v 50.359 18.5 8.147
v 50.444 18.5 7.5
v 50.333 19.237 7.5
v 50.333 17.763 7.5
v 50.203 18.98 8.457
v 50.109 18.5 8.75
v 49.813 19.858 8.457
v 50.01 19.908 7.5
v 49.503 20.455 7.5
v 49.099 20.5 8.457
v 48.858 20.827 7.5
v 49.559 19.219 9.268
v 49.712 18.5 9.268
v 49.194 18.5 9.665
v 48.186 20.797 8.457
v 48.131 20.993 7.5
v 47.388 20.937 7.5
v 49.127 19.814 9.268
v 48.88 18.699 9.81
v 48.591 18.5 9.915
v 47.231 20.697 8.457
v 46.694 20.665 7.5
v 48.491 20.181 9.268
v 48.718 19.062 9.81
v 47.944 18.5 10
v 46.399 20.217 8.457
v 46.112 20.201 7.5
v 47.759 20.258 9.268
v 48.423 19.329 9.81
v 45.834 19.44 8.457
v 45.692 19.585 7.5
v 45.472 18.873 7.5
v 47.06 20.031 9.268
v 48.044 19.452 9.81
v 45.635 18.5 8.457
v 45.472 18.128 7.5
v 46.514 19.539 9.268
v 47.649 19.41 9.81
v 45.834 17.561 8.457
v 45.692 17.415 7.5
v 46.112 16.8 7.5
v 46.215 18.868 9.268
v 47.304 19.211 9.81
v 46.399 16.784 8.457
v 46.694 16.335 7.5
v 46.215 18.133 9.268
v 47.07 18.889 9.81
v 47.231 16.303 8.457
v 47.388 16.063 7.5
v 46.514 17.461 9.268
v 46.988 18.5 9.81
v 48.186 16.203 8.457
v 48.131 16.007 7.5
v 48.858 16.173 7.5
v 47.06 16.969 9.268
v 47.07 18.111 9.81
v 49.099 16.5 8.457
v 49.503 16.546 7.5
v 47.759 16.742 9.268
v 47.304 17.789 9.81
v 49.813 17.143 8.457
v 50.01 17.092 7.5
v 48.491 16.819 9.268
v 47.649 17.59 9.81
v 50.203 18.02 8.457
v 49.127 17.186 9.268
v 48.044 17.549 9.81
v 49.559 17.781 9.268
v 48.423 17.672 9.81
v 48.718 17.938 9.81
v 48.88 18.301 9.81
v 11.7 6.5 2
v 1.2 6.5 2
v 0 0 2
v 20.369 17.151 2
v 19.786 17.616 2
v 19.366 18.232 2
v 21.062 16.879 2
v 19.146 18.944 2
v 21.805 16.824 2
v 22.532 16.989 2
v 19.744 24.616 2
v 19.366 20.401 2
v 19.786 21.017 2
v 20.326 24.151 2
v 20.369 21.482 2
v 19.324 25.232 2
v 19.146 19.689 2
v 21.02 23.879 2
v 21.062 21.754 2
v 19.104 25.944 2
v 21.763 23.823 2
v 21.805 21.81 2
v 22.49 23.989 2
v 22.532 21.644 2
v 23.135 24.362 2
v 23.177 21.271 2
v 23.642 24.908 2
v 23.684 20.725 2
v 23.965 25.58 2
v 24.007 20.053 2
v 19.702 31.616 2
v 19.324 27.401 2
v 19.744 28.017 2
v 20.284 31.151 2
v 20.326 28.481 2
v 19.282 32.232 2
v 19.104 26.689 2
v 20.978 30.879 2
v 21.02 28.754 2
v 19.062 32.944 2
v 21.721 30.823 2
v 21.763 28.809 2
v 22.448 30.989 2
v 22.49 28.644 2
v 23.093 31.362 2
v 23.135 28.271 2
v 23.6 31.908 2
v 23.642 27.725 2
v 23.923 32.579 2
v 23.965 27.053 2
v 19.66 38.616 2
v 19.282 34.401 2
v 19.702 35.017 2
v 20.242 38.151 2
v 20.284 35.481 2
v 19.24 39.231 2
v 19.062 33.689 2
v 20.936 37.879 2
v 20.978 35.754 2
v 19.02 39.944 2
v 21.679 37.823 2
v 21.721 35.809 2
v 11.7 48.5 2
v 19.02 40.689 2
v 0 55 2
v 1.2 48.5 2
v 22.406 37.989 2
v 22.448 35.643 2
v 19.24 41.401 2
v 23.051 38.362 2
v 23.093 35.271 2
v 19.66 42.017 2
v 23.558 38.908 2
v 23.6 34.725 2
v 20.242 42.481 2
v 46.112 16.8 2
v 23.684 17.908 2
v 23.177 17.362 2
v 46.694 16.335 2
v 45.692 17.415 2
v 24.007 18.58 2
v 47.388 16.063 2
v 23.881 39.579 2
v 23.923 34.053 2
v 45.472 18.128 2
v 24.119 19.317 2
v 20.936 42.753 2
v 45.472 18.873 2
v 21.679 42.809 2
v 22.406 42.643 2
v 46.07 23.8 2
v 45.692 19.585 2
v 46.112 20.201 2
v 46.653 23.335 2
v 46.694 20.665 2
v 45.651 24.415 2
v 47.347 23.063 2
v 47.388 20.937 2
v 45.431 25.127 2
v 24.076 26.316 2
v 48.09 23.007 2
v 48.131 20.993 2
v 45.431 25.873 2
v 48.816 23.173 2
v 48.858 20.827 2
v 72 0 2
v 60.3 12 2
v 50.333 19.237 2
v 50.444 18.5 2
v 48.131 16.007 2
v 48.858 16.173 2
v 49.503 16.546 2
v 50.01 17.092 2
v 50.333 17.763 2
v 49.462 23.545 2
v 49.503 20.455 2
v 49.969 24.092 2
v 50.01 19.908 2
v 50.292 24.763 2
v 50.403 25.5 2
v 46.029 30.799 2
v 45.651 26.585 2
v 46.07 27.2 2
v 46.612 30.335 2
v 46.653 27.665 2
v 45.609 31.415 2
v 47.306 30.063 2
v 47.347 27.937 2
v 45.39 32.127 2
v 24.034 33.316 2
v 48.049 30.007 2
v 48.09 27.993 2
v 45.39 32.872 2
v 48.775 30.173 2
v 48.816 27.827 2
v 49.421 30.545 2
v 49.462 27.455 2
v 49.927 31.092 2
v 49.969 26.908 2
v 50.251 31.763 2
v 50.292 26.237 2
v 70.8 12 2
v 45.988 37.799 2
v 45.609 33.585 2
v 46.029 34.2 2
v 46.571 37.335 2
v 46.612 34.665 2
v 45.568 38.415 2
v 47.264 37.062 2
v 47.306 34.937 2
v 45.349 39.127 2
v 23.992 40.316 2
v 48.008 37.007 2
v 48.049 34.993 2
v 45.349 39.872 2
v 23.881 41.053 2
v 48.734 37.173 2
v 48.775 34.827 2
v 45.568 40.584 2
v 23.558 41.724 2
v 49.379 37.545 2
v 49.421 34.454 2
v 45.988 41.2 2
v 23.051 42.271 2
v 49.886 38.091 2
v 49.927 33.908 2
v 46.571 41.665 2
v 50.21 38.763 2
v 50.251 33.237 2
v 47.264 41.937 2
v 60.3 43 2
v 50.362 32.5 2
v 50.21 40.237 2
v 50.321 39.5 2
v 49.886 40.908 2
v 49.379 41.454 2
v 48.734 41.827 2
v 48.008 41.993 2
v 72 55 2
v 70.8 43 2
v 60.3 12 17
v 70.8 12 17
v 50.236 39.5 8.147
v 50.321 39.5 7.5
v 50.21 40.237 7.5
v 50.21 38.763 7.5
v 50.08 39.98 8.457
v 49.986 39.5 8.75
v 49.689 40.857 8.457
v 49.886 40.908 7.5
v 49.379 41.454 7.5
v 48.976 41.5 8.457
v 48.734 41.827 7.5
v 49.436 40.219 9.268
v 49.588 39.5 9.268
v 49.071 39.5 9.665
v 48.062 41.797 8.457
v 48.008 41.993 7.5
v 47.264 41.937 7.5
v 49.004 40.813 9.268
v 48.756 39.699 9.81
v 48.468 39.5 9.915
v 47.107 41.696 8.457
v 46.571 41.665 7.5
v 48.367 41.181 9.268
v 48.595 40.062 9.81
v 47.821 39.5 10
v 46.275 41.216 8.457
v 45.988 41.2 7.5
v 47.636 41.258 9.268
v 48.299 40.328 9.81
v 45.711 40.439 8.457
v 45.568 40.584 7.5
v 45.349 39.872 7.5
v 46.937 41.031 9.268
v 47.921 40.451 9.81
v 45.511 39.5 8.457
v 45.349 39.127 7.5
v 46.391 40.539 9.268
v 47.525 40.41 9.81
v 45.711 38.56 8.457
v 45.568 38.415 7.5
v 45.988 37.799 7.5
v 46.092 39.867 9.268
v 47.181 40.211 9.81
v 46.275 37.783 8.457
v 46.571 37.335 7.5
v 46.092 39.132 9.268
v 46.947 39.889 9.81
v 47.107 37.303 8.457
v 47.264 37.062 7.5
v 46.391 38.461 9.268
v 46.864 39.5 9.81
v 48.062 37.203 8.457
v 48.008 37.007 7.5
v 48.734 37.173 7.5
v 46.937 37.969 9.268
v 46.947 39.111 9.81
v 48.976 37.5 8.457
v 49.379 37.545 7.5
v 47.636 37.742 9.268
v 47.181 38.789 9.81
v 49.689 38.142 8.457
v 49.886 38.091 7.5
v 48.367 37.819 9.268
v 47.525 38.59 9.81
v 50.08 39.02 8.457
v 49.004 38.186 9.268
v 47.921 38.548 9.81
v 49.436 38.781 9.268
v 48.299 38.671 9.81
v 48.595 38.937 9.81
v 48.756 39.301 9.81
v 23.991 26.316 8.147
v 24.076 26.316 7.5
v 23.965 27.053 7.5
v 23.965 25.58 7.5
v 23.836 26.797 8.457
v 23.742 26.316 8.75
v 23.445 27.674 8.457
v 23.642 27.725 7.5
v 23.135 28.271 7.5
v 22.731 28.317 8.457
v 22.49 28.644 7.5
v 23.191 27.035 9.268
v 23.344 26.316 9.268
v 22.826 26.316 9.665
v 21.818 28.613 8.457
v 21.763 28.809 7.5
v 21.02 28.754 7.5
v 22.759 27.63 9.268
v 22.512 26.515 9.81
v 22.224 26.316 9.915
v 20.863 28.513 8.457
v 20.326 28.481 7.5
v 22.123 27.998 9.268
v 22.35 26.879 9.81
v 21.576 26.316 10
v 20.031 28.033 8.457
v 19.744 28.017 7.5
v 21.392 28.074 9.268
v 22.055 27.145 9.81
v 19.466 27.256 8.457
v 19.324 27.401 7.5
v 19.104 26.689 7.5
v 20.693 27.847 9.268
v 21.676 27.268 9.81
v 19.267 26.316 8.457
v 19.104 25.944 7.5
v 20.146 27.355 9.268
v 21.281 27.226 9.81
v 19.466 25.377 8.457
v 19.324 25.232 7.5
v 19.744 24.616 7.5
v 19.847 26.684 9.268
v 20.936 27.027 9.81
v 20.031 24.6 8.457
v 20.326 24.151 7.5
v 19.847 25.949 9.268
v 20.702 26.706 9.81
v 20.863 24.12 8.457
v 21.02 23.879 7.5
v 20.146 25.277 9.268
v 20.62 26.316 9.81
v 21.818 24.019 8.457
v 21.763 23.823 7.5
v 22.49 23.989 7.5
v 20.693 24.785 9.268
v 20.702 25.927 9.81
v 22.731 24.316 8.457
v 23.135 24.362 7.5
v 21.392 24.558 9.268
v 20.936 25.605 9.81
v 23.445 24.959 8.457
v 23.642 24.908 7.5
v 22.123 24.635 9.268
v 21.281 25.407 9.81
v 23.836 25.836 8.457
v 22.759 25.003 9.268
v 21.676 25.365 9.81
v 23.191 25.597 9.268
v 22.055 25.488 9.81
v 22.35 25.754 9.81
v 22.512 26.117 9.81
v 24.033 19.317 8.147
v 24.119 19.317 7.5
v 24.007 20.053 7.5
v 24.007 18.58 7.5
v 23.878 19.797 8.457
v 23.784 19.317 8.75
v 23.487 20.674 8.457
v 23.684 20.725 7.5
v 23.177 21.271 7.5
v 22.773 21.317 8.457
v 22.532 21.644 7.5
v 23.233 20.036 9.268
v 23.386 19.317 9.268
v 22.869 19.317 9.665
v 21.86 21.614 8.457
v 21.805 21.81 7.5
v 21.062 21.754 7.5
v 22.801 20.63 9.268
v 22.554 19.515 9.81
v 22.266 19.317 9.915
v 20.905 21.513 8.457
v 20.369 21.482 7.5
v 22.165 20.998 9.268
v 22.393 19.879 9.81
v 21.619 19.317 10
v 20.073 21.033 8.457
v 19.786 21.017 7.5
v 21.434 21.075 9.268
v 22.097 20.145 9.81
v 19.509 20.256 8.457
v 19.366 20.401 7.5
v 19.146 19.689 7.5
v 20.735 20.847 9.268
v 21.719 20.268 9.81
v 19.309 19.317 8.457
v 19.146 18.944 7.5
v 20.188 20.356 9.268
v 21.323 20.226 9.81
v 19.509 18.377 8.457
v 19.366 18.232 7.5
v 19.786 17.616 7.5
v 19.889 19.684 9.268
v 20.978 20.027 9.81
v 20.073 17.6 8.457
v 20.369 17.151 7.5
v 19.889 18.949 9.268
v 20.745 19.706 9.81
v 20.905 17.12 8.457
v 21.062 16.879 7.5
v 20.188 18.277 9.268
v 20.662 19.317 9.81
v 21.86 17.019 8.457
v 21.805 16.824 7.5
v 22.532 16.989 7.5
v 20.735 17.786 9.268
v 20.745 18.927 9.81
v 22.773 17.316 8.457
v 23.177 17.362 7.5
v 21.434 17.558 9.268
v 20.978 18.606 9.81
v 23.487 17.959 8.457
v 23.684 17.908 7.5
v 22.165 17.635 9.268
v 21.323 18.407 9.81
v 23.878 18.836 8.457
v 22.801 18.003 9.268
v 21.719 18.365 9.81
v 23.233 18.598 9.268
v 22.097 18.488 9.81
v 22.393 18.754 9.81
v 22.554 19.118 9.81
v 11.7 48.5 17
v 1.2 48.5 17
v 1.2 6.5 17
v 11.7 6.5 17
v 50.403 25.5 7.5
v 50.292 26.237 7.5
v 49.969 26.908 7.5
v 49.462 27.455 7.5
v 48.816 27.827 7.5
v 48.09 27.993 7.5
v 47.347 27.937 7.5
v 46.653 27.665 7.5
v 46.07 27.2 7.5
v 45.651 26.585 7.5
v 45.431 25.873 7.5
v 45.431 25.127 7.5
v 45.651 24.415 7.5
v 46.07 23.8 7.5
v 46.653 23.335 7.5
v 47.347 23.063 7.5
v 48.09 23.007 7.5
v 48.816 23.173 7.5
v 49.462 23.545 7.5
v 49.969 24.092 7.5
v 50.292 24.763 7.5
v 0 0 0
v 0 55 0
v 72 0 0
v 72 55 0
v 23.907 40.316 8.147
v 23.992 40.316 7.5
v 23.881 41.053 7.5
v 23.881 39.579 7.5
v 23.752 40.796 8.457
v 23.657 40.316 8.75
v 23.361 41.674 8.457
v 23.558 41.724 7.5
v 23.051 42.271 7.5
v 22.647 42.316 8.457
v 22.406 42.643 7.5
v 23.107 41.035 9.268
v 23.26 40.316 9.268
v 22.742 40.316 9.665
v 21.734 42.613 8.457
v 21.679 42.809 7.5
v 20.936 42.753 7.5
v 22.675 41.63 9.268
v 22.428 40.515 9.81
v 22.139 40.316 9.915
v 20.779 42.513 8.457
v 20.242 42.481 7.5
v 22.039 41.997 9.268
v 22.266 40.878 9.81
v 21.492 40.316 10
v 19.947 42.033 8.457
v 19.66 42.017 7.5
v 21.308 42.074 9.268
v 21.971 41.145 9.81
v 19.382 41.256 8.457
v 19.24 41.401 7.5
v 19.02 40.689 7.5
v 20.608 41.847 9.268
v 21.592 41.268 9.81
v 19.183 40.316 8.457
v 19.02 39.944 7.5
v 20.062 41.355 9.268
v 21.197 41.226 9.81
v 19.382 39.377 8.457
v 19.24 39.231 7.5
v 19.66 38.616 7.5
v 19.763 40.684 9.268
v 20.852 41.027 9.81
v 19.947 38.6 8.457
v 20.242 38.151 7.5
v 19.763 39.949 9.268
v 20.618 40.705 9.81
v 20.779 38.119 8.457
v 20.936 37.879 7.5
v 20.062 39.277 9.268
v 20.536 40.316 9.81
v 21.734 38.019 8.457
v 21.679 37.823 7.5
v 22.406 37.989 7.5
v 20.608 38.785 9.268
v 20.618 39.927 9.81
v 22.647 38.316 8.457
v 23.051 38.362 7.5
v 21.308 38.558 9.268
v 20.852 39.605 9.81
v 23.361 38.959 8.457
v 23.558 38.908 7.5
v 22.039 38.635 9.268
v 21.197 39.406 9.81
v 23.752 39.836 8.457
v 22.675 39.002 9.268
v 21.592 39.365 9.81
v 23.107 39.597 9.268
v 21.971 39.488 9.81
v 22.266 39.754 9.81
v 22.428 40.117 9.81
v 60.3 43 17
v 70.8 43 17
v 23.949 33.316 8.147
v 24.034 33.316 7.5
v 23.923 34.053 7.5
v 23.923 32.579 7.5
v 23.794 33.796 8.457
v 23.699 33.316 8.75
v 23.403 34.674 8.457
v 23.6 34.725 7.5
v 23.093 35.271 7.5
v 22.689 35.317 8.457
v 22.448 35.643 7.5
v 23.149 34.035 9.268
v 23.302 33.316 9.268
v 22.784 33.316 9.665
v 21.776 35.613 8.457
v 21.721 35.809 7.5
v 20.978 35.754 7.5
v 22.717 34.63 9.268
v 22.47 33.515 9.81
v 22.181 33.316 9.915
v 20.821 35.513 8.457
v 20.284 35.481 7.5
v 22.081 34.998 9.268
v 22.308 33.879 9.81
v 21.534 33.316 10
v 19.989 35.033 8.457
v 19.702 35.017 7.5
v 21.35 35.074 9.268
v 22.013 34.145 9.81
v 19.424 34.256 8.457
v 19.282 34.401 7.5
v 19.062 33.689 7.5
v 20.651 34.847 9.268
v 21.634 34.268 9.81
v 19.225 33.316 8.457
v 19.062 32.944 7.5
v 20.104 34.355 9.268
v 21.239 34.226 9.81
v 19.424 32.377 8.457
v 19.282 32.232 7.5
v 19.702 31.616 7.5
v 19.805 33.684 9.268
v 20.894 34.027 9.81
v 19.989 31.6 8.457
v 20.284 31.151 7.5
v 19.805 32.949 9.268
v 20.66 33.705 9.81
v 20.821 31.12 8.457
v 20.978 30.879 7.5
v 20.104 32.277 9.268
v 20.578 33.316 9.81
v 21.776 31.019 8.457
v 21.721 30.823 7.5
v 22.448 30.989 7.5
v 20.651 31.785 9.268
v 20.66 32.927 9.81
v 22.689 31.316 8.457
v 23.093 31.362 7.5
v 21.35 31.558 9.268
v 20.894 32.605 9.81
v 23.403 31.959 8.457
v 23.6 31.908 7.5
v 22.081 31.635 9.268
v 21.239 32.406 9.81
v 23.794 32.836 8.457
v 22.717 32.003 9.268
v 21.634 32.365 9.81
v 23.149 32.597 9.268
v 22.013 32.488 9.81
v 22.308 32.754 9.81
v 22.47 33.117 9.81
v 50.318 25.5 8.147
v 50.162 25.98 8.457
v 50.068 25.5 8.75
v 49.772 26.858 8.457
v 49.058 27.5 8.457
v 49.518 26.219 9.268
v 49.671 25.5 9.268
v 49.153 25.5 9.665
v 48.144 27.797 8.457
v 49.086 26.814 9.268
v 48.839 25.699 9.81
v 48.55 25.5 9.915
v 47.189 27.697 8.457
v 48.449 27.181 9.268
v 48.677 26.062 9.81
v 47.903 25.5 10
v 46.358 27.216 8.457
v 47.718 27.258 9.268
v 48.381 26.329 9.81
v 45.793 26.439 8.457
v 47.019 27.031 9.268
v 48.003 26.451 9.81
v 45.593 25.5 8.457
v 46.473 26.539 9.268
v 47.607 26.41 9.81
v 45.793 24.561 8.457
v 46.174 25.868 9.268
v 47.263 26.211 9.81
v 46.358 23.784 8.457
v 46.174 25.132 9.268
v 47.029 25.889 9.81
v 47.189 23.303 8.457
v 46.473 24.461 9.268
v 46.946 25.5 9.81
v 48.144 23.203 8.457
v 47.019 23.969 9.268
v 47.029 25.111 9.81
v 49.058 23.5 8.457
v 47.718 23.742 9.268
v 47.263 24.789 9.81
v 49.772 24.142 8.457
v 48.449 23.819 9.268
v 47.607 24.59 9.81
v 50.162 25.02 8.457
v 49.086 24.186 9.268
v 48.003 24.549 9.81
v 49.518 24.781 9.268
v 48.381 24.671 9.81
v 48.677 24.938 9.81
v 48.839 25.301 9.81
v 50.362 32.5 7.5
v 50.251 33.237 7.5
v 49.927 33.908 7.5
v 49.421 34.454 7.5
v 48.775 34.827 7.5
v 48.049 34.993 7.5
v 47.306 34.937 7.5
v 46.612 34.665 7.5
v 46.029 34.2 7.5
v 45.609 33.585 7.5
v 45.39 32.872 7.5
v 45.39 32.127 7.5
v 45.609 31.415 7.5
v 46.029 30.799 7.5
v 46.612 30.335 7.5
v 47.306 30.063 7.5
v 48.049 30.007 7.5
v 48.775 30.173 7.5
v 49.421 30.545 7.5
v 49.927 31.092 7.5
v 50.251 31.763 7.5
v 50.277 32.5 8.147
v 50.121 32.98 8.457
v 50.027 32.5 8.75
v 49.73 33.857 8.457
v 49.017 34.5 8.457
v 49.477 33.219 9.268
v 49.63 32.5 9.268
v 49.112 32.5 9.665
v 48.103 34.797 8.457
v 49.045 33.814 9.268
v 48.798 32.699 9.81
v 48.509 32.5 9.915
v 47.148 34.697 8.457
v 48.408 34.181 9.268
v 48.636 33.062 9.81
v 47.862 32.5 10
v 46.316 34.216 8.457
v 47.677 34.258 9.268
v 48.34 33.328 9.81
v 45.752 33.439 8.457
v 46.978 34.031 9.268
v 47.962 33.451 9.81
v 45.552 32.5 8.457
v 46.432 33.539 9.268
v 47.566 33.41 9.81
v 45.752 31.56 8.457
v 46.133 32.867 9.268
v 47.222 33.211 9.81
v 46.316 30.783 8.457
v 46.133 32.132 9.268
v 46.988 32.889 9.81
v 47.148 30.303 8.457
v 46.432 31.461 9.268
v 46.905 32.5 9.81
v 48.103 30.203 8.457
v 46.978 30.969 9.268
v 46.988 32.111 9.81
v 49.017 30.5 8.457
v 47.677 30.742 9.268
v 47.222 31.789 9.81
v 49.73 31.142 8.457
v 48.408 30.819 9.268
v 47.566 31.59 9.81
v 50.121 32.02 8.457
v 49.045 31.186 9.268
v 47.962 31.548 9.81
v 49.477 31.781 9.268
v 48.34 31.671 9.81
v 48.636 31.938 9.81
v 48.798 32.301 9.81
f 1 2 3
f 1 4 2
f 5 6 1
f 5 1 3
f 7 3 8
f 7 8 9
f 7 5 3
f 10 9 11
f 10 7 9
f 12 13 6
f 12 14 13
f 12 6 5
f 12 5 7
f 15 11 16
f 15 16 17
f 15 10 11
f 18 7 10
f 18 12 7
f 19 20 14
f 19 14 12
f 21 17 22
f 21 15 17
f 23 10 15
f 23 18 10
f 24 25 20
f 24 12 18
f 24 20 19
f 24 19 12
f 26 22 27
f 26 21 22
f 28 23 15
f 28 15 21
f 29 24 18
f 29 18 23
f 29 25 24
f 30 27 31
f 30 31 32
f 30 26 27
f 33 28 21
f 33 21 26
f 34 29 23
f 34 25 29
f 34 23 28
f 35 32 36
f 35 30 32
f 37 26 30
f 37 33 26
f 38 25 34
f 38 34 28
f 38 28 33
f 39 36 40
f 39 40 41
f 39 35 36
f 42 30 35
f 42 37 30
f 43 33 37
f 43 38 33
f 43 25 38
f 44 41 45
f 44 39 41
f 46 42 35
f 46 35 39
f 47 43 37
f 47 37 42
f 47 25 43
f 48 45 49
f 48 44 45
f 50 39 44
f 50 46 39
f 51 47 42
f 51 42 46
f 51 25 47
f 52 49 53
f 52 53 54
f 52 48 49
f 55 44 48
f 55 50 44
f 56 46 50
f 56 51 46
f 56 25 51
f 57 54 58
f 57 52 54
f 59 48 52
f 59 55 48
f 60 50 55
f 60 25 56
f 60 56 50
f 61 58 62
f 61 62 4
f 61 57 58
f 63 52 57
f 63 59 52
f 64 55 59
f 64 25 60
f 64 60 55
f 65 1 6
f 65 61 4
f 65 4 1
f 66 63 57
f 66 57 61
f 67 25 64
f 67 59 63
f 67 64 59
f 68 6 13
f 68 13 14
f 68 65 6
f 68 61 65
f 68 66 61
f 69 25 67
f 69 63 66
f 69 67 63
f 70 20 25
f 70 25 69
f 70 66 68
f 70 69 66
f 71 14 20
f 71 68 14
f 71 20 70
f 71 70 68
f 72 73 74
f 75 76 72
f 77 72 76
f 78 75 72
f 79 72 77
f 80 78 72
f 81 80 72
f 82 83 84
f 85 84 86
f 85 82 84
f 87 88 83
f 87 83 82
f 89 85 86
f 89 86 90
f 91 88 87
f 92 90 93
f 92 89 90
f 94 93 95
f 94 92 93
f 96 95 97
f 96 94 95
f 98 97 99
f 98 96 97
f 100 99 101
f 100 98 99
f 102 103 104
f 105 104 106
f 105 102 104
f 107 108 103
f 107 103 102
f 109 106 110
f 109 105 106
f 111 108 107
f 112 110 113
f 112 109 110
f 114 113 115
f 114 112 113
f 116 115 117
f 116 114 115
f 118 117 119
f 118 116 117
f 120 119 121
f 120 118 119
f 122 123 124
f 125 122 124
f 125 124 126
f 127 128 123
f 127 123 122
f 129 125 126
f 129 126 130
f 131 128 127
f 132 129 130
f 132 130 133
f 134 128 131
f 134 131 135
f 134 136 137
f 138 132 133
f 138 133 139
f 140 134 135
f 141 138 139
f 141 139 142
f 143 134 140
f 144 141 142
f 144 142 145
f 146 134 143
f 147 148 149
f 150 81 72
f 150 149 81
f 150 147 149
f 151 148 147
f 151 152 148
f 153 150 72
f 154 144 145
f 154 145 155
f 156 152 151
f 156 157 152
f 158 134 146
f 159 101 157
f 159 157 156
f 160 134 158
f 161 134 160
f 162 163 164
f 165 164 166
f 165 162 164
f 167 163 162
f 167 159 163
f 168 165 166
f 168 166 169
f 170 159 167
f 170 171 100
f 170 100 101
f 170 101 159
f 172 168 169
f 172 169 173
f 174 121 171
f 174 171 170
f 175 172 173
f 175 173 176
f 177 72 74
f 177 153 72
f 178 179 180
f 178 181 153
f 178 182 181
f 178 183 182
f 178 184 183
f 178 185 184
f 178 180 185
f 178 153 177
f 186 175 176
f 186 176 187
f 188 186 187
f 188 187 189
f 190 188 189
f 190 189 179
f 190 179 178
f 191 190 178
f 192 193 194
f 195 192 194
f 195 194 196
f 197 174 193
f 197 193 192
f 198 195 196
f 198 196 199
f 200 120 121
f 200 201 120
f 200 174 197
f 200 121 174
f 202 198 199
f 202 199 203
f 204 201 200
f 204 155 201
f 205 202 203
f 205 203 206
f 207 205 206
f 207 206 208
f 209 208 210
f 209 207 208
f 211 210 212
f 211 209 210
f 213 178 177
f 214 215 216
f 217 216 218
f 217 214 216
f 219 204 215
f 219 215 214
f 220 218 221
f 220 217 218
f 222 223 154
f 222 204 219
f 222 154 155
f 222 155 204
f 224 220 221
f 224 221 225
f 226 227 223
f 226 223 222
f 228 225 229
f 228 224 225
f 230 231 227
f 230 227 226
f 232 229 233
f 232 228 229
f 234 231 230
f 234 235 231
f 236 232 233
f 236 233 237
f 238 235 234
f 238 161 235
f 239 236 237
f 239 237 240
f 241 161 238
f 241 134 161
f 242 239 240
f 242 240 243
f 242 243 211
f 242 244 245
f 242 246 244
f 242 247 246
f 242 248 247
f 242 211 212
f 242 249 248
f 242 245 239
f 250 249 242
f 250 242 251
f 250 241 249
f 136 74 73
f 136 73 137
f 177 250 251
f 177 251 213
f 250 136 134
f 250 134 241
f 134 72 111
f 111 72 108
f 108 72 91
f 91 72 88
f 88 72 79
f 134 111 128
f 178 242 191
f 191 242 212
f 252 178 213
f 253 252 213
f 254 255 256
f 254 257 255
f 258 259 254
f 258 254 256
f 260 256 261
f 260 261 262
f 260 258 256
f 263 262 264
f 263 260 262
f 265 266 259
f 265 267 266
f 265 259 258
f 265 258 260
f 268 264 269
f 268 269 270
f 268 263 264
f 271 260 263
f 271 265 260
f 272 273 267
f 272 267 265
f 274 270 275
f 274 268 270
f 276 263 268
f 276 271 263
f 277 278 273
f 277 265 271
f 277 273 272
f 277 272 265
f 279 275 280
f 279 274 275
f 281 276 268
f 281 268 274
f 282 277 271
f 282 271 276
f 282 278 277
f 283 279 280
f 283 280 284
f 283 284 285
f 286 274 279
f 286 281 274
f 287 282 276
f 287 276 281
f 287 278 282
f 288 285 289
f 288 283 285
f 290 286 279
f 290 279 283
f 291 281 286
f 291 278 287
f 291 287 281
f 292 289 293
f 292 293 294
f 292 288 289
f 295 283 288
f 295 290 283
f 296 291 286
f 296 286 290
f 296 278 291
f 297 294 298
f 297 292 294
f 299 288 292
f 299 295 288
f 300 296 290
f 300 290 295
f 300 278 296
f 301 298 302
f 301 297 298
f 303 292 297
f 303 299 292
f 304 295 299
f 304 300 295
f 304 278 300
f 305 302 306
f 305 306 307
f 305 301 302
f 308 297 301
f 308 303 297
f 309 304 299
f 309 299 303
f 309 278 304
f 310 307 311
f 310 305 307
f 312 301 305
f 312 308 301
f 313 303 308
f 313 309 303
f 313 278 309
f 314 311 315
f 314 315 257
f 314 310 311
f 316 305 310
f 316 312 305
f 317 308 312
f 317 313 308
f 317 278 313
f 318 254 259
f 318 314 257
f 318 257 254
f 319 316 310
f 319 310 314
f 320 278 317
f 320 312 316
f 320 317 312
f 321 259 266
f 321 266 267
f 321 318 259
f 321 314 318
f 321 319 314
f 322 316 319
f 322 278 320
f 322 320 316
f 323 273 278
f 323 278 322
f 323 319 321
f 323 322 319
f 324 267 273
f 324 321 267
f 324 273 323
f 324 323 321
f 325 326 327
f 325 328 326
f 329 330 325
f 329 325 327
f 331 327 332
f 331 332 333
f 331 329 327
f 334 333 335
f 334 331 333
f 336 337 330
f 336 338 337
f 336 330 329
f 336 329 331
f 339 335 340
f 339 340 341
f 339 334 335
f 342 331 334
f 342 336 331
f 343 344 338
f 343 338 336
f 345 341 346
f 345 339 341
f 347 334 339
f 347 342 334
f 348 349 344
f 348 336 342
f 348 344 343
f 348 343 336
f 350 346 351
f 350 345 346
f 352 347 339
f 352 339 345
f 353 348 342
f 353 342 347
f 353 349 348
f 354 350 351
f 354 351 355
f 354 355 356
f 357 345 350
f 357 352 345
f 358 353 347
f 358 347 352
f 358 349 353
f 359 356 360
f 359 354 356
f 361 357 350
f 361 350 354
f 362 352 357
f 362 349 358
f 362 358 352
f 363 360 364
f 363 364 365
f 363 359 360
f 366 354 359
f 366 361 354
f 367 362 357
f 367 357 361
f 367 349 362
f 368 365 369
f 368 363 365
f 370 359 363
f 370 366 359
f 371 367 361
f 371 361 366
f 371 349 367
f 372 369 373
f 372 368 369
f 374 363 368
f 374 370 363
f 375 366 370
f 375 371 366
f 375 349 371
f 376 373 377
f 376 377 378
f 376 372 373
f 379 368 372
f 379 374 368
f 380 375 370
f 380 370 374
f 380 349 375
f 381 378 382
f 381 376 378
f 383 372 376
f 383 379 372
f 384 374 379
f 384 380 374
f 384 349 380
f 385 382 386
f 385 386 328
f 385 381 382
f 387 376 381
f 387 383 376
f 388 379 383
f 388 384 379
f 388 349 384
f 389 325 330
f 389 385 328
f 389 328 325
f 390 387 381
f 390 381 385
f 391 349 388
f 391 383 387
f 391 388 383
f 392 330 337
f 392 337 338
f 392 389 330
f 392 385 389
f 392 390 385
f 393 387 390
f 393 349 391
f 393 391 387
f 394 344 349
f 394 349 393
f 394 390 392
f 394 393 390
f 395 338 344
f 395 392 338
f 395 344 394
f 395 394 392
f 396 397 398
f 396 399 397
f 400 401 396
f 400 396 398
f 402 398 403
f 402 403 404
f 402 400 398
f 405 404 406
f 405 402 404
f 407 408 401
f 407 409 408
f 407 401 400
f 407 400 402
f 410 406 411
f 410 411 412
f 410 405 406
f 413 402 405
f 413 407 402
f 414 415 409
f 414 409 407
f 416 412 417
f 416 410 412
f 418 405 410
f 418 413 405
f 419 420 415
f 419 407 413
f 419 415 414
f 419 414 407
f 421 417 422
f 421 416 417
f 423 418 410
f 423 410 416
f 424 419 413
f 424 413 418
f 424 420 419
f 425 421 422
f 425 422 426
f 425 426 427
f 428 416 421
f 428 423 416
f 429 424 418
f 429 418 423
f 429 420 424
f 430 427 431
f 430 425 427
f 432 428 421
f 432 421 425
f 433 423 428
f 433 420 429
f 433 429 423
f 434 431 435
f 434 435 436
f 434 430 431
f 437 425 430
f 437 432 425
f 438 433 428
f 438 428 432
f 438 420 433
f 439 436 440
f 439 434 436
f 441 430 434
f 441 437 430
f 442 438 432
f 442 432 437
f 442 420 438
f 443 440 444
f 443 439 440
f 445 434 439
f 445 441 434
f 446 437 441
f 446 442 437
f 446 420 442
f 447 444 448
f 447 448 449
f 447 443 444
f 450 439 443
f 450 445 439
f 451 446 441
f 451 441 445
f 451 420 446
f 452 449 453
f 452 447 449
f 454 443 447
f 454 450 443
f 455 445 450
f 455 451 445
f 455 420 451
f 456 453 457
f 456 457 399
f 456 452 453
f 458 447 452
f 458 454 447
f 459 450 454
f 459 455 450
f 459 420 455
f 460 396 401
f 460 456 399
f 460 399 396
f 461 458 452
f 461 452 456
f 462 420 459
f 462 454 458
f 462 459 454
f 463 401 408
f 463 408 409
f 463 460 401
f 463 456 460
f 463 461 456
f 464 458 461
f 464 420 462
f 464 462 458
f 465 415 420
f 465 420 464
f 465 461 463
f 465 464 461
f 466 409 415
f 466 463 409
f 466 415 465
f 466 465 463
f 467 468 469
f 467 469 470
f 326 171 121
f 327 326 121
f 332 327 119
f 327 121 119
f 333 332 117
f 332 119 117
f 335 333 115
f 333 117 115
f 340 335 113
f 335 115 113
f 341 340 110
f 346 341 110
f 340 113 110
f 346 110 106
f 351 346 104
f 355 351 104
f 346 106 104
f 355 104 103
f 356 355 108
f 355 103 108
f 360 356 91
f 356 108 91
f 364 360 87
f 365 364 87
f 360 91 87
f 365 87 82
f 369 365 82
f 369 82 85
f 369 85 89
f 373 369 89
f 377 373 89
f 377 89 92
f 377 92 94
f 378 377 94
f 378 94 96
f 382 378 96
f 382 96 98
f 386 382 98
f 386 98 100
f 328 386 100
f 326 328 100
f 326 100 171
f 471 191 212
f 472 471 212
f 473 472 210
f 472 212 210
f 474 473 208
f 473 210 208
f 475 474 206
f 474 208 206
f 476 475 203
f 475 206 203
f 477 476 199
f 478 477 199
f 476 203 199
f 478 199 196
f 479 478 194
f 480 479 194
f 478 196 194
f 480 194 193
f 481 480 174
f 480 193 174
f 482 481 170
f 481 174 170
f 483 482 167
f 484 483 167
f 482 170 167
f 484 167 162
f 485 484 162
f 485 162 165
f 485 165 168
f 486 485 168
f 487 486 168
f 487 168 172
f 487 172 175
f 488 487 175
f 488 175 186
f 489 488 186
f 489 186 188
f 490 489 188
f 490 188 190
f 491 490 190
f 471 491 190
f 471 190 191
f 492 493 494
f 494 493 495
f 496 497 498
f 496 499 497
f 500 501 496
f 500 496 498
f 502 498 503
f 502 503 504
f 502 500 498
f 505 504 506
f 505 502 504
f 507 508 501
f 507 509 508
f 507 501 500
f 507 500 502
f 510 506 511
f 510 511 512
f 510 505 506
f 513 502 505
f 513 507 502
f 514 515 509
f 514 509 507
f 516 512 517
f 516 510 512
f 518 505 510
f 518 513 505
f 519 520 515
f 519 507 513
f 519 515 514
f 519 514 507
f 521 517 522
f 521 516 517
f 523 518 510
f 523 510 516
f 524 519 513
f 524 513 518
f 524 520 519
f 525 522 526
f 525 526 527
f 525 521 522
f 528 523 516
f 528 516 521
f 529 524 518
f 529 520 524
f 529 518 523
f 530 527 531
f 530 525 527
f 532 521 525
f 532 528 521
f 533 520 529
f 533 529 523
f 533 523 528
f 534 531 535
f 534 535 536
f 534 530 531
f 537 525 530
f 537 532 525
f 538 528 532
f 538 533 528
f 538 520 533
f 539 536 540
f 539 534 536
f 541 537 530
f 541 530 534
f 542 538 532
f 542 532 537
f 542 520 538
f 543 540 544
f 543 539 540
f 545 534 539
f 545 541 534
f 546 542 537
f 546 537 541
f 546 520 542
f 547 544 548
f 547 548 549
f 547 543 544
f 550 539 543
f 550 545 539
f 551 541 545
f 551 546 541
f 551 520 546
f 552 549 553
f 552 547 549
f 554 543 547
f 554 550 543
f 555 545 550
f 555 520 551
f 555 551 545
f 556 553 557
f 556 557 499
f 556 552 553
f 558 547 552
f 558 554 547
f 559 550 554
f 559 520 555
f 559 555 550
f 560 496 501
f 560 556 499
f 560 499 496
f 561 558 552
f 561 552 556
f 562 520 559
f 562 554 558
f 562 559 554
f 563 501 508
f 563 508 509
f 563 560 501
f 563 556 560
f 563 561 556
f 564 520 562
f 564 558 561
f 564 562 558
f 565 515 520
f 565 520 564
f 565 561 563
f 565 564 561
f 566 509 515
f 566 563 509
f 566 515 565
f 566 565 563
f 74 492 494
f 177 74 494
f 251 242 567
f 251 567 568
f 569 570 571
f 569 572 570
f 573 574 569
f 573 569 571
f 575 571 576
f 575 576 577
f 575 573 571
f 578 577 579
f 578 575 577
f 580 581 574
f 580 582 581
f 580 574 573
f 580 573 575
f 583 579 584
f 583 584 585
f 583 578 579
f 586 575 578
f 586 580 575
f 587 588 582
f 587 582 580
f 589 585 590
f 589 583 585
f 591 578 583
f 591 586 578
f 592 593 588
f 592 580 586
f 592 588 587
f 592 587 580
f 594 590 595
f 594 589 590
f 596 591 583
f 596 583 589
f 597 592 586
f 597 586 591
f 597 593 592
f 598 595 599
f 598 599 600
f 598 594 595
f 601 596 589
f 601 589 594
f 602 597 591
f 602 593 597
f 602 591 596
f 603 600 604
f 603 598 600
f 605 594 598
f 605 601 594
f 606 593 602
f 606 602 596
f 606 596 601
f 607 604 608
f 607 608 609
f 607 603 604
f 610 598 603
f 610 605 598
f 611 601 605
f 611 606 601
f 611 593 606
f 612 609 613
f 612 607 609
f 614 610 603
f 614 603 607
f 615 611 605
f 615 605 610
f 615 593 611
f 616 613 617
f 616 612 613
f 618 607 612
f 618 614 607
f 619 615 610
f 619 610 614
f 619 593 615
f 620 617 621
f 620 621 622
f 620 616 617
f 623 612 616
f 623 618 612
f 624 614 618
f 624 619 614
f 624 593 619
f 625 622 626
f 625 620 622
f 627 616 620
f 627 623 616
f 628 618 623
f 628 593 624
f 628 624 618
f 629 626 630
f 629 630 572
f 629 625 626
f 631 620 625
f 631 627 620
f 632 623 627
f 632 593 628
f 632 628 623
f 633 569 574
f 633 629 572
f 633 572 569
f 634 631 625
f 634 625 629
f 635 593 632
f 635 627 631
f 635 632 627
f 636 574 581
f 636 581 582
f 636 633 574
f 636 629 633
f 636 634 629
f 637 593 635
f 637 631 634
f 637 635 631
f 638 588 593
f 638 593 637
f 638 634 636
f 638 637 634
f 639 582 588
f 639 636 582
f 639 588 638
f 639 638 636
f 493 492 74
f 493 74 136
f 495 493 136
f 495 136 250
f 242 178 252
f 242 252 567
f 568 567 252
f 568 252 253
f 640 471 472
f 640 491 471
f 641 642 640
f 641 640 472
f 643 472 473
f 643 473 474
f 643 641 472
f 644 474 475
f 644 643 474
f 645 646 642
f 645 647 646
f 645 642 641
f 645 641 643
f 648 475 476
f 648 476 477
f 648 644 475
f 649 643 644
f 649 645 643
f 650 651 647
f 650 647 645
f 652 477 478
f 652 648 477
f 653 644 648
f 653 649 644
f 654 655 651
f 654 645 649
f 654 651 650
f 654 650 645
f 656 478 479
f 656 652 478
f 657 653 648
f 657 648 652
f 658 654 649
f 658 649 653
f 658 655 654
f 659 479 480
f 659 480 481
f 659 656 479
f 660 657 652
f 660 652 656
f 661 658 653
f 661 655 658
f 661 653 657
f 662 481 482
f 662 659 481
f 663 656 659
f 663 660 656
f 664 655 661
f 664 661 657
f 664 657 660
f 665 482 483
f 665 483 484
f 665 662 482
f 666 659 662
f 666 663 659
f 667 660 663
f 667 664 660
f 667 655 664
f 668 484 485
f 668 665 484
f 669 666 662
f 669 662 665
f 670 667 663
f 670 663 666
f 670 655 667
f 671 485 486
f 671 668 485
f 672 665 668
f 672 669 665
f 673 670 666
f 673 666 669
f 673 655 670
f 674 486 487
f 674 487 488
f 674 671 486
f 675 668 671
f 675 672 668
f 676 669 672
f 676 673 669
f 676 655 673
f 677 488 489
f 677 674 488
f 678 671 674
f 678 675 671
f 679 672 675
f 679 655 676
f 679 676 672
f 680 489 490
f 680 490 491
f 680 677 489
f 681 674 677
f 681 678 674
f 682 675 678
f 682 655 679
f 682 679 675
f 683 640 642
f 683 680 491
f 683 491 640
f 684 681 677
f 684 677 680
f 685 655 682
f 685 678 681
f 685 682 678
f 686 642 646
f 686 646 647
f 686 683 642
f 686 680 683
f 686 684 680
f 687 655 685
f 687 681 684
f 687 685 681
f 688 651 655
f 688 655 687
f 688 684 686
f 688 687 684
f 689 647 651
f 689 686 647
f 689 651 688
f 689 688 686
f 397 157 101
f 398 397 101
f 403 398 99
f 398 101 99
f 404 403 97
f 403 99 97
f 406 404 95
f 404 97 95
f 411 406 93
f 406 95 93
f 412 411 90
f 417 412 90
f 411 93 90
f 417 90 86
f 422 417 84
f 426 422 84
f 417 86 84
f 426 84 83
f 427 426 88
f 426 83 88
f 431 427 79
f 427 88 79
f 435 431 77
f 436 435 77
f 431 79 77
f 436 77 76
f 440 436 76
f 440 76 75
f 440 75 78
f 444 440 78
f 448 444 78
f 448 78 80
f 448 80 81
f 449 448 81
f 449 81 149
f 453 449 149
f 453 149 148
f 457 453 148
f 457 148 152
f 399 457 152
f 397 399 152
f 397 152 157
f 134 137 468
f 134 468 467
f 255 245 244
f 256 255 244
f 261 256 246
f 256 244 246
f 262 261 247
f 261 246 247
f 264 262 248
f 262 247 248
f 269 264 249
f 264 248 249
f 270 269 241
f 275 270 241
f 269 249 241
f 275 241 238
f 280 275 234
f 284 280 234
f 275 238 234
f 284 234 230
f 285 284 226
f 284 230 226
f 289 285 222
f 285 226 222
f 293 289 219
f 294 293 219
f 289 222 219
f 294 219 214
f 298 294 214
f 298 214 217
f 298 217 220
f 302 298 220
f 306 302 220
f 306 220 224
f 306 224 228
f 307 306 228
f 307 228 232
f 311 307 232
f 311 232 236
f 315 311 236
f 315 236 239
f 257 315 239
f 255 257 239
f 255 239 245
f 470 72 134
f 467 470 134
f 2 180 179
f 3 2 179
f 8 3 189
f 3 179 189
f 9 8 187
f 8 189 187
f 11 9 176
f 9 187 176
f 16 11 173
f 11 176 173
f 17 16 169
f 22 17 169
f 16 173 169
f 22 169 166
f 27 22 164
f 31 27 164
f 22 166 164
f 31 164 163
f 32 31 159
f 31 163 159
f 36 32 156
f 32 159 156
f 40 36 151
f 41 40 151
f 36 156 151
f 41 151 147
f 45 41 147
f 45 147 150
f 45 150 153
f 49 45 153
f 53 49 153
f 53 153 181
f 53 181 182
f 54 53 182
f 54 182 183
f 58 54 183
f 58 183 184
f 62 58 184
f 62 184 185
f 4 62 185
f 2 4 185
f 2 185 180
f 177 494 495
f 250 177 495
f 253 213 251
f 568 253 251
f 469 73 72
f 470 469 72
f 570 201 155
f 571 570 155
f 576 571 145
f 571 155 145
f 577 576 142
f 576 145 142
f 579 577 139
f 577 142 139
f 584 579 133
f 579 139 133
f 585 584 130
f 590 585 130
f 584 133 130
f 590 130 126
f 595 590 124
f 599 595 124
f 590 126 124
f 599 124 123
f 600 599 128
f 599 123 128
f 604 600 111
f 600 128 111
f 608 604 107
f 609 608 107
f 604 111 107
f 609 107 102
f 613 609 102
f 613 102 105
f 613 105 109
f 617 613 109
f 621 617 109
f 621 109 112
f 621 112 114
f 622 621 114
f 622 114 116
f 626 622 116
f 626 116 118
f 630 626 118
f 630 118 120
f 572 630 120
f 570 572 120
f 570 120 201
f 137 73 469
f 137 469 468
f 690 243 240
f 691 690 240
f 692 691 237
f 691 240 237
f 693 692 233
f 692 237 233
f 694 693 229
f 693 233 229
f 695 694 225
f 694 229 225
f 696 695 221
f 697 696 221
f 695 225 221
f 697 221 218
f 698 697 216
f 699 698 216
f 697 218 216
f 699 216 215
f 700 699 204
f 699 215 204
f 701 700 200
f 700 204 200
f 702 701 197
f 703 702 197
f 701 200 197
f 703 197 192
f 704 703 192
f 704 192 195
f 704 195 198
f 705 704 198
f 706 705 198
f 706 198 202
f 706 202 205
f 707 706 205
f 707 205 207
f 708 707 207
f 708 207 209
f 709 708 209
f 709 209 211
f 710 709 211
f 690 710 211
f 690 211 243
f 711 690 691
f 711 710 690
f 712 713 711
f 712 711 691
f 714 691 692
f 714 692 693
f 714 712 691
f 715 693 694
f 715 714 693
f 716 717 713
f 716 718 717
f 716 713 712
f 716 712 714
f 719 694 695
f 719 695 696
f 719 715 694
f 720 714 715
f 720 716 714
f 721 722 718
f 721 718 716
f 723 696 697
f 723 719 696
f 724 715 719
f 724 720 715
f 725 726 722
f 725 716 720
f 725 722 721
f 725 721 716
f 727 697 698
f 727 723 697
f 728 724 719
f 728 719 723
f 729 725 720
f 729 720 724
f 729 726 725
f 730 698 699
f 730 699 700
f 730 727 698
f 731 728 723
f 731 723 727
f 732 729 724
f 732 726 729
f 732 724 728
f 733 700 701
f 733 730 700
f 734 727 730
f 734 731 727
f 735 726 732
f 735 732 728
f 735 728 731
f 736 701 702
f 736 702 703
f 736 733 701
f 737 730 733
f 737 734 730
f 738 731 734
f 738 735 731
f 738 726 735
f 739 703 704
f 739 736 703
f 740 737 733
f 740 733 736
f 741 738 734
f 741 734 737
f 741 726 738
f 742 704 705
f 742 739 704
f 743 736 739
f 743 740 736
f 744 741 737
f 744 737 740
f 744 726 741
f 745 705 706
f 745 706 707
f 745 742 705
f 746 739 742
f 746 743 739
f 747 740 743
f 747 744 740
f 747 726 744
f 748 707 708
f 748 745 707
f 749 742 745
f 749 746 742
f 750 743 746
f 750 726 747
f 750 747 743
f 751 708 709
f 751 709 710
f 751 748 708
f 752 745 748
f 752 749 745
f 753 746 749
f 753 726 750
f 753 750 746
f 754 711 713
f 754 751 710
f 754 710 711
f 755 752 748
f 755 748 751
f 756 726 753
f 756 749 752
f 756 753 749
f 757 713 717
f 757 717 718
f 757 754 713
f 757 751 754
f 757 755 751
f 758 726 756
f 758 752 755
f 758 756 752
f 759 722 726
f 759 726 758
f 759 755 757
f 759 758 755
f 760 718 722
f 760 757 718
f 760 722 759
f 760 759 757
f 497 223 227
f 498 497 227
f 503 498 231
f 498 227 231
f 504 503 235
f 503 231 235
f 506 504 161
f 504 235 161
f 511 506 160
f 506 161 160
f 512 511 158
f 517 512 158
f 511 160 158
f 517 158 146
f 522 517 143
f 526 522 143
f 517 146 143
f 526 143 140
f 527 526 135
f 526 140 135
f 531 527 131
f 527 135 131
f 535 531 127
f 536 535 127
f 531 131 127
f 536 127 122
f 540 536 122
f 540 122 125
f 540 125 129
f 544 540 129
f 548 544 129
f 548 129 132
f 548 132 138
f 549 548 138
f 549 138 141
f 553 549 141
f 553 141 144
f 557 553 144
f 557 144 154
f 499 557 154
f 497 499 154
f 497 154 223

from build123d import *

# Parameters (mm, degrees)
F0_W     = 72
F0_H     = 55
F0_R     = 2.5
F0_W_2   = 10.5
F0_H_2   = 42
F0_H_3   = 31
F1_DEPTH = 2
F2_DEPTH = 17
F3_DEPTH = 10
F4_R     = 2.5


with BuildPart() as f1:
    # F0 (on Top) → F1 (new body)
    with BuildSketch(Plane.XY):
        with Locations((36, 27.5)):
            Rectangle(F0_W, F0_H)
        with Locations((21.618534, 19.316525)):
            Circle(F0_R, mode=Mode.SUBTRACT)
        with Locations((21.576459, 26.316399)):
            Circle(F0_R, mode=Mode.SUBTRACT)
        with Locations((47.944249, 18.500125)):
            Circle(F0_R, mode=Mode.SUBTRACT)
        with Locations((47.903061, 25.500003)):
            Circle(F0_R, mode=Mode.SUBTRACT)
        with Locations((6.45, 27.5)):
            Rectangle(F0_W_2, F0_H_2, mode=Mode.SUBTRACT)
        with Locations((21.534385, 33.316272)):
            Circle(F0_R, mode=Mode.SUBTRACT)
        with Locations((21.49231, 40.316146)):
            Circle(F0_R, mode=Mode.SUBTRACT)
        with Locations((47.861874, 32.499882)):
            Circle(F0_R, mode=Mode.SUBTRACT)
        with Locations((47.820686, 39.499761)):
            Circle(F0_R, mode=Mode.SUBTRACT)
        with Locations((65.55, 27.5)):
            Rectangle(F0_W_2, F0_H_3, mode=Mode.SUBTRACT)
    extrude(amount=F1_DEPTH)

    # F0 (on Top) → F2 (join)
    with BuildSketch(Plane.XY):
        with Locations((65.55, 27.5)):
            Rectangle(F0_W_2, F0_H_3)
        with Locations((6.45, 27.5)):
            Rectangle(F0_W_2, F0_H_2)
    extrude(amount=F2_DEPTH)

    # F0 (on Top) → F3 (join)
    with BuildSketch(Plane.XY):
        with Locations((21.49231, 40.316146)):
            Circle(F0_R)
        with Locations((21.534385, 33.316272)):
            Circle(F0_R)
        with Locations((21.576459, 26.316399)):
            Circle(F0_R)
        with Locations((21.618534, 19.316525)):
            Circle(F0_R)
        with Locations((47.820686, 39.499761)):
            Circle(F0_R)
        with Locations((47.861874, 32.499882)):
            Circle(F0_R)
        with Locations((47.903061, 25.500003)):
            Circle(F0_R)
        with Locations((47.944249, 18.500125)):
            Circle(F0_R)
    extrude(amount=F3_DEPTH)

    # F4
    f4_edges = [f1.edges().sort_by_distance(p)[0] for p in [
        (18.99231, 40.316146, 10),
        (19.034385, 33.316272, 10),
        (19.076459, 26.316399, 10),
        (19.118534, 19.316525, 10),
        (45.320686, 39.499761, 10),
        (45.361874, 32.499882, 10),
        (45.403061, 25.500003, 10),
        (45.444249, 18.500125, 10),
    ]]
    fillet(f4_edges, radius=F4_R)


solid = f1.part
